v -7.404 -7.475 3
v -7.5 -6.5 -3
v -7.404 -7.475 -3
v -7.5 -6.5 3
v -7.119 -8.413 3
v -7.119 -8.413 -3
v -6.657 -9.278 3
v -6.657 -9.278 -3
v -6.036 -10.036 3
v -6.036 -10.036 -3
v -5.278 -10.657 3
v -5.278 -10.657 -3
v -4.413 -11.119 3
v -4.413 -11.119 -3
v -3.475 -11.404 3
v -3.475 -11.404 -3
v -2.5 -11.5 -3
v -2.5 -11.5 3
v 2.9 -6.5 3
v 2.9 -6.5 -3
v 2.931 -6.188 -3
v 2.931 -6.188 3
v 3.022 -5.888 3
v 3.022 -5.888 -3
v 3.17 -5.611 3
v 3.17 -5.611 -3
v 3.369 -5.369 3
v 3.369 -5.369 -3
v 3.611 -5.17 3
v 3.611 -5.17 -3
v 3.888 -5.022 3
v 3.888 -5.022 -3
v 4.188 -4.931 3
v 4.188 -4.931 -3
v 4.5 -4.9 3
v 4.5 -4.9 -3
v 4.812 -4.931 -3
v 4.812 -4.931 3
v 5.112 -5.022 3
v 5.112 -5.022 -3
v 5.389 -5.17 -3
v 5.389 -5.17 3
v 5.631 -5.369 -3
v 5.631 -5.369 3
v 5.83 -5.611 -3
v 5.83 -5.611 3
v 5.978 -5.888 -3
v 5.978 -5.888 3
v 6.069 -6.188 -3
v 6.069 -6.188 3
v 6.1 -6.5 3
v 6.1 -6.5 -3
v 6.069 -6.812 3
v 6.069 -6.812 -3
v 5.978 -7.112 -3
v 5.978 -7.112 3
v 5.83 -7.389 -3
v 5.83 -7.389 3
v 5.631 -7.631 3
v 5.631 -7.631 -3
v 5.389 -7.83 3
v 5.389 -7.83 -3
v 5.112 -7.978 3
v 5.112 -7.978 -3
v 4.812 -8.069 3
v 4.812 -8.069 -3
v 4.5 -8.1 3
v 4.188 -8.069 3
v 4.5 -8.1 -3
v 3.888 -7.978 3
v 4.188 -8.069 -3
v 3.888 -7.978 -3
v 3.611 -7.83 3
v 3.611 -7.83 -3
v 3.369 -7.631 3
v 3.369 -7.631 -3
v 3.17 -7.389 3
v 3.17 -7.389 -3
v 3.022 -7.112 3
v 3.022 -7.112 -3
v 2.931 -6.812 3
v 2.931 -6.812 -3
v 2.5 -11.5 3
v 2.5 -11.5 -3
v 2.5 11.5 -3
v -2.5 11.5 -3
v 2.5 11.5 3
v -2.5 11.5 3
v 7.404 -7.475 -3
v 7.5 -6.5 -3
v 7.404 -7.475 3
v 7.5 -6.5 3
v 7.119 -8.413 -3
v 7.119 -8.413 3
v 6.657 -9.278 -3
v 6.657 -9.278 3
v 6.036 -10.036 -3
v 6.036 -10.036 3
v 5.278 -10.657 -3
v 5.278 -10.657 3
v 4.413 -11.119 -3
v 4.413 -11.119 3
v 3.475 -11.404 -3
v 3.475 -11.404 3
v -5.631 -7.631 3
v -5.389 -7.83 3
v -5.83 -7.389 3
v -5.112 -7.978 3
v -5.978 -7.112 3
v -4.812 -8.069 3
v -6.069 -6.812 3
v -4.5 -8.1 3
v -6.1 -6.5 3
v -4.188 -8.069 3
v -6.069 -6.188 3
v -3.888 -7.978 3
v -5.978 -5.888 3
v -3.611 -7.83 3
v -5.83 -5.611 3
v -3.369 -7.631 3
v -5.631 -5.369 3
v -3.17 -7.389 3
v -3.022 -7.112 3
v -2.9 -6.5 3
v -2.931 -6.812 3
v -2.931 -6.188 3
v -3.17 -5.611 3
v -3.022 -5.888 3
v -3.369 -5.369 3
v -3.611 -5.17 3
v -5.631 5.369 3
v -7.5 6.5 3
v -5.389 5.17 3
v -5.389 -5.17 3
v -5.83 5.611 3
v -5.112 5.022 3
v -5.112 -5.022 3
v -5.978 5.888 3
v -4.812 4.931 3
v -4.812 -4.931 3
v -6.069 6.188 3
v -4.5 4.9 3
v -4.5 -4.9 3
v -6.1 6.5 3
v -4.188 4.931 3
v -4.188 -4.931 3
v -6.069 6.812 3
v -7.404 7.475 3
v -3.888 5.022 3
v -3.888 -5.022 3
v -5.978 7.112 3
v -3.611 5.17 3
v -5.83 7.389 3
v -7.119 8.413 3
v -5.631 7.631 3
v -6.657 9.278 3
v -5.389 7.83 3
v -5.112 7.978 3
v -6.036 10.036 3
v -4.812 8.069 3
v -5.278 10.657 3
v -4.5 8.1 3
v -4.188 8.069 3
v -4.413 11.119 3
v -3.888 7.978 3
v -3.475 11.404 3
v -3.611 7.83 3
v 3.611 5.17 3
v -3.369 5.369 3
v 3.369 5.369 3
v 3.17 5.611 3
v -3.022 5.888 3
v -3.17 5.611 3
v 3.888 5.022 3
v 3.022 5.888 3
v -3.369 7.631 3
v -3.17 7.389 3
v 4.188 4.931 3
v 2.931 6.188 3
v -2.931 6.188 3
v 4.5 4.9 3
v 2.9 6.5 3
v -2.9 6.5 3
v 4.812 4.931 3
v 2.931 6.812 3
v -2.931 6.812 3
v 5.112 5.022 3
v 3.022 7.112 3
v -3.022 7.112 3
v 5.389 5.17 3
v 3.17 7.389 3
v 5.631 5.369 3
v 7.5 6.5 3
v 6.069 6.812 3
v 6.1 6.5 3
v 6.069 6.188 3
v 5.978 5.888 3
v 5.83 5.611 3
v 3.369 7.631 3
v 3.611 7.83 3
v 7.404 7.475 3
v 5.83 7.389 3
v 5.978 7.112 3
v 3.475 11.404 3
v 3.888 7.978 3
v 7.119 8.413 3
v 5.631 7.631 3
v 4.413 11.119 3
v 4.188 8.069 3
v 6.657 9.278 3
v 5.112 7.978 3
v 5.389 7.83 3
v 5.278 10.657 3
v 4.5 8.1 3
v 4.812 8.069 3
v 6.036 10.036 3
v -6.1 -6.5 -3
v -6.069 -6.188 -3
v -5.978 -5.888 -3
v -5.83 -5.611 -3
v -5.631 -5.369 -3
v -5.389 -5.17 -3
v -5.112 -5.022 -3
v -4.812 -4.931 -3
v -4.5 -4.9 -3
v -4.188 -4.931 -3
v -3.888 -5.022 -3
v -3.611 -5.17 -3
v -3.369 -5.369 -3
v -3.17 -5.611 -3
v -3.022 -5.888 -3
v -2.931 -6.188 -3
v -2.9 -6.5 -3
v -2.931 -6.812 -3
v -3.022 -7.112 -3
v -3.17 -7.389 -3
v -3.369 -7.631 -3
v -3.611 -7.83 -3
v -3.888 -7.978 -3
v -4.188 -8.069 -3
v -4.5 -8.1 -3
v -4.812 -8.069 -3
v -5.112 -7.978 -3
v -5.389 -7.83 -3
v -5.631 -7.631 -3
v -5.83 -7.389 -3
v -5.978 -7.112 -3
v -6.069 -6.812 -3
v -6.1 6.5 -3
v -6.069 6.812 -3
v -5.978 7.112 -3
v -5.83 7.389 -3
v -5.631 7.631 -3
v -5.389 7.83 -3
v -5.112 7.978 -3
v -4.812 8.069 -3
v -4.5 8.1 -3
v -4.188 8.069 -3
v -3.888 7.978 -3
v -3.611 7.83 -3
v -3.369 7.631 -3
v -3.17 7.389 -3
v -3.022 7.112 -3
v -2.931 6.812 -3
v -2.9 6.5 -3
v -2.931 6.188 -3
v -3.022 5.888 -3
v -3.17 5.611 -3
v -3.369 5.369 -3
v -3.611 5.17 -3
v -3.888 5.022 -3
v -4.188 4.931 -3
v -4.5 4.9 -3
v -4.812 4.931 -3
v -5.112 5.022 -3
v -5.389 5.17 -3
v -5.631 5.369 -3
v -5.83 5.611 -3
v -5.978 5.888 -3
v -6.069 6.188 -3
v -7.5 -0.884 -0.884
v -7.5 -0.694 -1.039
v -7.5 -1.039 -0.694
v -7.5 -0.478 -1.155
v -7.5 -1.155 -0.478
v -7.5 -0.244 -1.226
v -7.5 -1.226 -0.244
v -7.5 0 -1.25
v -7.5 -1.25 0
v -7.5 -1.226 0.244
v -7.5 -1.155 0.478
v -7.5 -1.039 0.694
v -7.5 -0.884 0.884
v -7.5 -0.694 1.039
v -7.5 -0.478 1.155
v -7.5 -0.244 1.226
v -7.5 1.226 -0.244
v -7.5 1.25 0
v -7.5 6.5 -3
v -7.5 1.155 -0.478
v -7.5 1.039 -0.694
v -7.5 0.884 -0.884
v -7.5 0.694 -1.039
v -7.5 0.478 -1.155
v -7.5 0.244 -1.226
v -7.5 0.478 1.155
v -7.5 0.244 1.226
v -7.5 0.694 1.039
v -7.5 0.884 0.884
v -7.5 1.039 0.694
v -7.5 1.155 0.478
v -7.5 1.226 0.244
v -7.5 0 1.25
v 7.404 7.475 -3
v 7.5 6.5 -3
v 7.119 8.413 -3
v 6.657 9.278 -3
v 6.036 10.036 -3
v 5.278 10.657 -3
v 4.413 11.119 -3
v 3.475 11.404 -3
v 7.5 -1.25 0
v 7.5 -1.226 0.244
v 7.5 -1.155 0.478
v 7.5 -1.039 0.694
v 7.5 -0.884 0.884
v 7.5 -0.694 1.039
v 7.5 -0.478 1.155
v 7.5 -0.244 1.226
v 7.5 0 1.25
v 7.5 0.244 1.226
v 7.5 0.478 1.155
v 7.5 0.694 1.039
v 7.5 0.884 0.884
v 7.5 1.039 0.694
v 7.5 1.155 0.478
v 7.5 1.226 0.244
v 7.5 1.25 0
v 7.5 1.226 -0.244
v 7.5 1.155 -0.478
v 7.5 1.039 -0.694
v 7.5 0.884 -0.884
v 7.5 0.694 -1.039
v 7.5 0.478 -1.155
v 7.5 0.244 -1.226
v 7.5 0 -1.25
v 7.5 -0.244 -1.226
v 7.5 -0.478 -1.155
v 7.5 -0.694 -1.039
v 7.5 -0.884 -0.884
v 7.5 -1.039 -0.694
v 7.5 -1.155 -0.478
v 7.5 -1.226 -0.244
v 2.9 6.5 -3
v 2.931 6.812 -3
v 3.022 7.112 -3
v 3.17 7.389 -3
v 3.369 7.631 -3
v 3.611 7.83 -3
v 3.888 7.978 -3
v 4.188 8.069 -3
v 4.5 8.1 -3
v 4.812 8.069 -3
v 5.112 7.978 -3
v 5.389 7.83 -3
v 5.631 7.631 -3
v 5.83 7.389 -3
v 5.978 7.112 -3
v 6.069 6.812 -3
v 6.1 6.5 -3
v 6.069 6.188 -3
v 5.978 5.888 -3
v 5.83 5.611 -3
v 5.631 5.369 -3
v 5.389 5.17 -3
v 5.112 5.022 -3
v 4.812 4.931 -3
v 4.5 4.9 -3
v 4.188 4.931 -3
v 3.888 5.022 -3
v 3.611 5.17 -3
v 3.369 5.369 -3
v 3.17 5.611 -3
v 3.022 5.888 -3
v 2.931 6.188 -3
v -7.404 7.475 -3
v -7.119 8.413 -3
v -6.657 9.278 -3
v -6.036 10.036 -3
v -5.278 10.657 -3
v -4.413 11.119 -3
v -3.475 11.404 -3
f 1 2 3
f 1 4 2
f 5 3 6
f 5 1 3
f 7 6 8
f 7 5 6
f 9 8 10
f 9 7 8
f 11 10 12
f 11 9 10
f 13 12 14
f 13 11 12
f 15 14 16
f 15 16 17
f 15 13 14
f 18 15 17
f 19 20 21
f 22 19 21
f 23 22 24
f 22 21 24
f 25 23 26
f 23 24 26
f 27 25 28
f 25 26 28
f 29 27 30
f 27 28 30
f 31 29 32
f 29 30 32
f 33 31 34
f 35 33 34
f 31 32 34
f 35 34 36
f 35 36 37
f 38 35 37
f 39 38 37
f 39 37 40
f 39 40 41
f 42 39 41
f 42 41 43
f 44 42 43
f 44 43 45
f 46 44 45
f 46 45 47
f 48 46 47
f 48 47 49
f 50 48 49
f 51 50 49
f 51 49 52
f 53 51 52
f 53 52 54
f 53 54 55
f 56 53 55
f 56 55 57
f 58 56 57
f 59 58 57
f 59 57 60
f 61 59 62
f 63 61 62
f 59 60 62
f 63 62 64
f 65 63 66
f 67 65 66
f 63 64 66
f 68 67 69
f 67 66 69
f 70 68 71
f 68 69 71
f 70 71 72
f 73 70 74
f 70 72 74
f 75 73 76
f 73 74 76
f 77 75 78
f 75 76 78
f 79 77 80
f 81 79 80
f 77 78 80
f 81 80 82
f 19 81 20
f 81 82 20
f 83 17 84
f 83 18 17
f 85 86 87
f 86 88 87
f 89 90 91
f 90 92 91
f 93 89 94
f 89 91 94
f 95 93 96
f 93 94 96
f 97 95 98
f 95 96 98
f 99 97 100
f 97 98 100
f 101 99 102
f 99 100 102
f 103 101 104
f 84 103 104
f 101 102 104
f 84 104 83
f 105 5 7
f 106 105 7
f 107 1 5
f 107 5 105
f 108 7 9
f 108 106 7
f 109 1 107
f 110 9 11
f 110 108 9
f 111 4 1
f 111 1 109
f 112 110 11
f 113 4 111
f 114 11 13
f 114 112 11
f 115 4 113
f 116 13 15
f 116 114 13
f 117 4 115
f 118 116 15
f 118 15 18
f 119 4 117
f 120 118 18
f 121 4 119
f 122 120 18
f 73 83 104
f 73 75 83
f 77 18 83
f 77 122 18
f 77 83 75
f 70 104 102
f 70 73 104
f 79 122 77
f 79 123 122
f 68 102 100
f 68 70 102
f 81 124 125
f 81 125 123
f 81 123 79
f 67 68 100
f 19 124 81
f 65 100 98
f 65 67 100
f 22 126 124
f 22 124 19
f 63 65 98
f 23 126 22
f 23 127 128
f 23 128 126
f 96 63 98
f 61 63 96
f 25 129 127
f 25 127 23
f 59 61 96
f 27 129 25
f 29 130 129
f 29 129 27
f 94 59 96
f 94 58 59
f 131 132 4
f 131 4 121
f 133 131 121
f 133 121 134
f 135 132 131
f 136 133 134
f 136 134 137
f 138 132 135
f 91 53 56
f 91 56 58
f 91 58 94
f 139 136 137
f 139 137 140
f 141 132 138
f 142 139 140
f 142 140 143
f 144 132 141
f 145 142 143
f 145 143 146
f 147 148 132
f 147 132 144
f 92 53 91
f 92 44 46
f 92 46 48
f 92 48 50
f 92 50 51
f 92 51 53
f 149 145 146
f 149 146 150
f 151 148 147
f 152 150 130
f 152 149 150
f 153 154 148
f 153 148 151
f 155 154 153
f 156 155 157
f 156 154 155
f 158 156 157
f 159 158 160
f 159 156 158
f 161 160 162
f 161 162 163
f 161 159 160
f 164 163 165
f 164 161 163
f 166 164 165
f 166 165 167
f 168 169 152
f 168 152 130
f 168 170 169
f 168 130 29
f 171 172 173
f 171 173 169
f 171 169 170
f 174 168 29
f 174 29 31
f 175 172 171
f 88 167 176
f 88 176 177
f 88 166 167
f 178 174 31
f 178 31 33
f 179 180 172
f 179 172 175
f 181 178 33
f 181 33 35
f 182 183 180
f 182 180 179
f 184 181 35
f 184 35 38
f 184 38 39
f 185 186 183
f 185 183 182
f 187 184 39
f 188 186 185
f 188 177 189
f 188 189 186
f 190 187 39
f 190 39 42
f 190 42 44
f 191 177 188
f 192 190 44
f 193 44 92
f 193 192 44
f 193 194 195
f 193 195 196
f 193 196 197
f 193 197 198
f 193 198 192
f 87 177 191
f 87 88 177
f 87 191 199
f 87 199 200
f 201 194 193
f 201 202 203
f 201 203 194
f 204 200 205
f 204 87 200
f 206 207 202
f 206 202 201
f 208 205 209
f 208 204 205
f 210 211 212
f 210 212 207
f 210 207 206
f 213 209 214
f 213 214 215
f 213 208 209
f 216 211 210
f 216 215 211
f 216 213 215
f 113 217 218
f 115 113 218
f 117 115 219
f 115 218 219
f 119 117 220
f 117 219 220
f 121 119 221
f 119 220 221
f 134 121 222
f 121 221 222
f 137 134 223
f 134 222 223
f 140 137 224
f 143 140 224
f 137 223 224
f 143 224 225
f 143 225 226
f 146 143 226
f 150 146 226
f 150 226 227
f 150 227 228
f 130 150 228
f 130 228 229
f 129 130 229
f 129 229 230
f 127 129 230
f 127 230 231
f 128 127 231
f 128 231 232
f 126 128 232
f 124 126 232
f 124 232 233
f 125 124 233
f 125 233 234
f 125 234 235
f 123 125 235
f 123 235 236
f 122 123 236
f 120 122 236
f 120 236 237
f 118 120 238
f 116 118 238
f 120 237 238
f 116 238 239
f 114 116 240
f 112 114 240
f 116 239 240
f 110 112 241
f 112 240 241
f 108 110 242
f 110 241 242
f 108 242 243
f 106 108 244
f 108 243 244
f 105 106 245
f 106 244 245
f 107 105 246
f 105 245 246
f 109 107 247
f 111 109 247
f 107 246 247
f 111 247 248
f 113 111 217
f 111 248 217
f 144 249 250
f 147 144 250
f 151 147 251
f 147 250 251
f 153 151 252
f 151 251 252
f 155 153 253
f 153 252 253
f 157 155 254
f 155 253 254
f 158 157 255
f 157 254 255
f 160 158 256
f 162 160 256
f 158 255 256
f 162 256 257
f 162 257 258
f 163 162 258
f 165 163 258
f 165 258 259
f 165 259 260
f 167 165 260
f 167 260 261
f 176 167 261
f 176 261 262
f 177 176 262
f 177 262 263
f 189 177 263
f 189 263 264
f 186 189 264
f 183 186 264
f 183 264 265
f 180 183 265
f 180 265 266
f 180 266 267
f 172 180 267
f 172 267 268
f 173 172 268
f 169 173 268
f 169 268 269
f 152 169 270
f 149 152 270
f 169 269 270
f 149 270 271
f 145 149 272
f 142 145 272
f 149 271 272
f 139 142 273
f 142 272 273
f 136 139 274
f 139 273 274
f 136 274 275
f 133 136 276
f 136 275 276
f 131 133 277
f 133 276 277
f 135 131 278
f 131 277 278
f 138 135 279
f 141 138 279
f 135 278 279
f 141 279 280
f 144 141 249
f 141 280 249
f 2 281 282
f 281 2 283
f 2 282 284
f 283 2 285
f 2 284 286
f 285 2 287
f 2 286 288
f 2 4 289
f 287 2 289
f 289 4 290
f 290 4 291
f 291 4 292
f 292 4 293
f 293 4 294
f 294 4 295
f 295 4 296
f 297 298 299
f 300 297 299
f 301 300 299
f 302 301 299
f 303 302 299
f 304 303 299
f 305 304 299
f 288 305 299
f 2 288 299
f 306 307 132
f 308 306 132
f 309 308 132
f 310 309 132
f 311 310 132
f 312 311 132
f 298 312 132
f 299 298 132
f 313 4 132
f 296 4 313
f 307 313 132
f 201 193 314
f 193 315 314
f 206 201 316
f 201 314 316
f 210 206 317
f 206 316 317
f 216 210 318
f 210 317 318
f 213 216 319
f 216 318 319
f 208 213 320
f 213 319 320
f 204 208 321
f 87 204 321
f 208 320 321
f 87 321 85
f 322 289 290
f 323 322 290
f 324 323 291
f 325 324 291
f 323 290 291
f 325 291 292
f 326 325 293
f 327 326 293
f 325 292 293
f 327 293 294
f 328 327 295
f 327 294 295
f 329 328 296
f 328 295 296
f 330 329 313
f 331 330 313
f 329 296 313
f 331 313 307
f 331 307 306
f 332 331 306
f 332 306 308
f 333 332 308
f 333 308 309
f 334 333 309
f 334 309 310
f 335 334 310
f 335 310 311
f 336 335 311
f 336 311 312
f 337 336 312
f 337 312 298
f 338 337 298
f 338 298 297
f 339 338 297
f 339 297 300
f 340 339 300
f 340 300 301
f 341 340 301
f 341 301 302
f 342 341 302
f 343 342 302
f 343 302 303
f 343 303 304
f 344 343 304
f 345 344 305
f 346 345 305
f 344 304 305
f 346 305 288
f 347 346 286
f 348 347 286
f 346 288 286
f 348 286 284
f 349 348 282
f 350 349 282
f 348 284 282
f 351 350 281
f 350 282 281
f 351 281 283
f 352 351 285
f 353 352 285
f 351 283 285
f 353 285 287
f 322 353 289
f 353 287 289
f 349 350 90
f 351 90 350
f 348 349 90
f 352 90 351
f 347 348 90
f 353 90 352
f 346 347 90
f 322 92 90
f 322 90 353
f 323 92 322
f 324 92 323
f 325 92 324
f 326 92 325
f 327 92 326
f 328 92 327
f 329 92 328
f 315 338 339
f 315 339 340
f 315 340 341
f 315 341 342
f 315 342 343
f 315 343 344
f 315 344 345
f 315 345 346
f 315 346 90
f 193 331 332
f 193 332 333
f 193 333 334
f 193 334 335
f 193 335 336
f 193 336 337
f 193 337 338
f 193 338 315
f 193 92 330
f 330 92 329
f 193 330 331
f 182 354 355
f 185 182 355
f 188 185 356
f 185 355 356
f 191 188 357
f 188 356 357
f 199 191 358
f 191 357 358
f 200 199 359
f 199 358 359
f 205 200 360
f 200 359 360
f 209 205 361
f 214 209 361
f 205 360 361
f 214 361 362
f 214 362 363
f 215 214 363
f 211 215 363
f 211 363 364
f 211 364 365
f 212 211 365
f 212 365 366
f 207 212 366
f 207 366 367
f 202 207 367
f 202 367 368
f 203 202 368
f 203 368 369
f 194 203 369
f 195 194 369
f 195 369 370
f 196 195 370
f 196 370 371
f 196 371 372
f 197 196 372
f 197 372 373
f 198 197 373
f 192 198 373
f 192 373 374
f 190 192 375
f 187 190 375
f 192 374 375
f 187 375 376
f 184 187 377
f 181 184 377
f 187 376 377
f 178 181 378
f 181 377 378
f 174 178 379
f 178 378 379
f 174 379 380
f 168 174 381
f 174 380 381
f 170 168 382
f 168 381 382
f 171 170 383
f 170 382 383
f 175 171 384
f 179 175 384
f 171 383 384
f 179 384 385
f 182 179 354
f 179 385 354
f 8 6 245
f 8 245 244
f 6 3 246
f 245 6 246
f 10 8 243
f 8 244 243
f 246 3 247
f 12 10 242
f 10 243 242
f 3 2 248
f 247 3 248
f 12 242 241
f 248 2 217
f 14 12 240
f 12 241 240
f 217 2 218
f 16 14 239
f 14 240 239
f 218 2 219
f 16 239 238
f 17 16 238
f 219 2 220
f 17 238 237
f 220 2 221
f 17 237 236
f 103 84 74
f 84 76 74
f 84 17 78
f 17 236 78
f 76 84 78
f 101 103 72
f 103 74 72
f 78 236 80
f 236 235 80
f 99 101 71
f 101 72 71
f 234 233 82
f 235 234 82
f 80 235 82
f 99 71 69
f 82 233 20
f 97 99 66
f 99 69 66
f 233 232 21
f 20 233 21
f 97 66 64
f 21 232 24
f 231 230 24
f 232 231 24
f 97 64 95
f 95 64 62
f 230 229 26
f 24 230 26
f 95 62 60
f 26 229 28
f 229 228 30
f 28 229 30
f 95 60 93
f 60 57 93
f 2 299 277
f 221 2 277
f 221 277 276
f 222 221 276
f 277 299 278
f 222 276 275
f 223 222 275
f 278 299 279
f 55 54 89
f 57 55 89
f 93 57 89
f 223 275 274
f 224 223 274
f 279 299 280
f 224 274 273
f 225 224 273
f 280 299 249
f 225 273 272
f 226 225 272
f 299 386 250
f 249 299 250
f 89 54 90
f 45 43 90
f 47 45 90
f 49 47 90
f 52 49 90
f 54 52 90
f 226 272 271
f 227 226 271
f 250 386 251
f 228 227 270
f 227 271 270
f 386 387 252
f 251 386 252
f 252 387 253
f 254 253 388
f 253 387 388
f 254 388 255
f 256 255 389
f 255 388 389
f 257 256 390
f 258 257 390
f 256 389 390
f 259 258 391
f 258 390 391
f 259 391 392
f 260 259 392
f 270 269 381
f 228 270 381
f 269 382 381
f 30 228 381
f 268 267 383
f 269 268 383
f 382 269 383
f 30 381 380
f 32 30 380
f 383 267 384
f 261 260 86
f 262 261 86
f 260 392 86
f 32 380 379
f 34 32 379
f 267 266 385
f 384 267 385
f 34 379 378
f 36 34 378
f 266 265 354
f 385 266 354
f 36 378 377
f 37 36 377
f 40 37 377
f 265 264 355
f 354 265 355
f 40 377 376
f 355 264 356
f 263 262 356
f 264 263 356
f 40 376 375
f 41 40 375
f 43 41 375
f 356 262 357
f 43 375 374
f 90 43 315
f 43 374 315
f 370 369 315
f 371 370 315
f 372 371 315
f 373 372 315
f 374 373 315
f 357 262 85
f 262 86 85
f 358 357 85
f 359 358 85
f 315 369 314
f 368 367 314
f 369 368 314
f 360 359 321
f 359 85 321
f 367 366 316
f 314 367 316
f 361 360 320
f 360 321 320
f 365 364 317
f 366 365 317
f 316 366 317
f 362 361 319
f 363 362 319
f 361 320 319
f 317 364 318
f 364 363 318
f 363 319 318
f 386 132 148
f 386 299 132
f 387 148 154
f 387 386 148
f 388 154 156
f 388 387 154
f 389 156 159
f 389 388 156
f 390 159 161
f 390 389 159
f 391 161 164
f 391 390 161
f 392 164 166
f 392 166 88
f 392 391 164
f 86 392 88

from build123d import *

# Parameters (mm, degrees)
SKETCH_1_W         = 15
SKETCH_1_H         = 23
EXTRUDE_1_DEPTH    = 3
FILLET_1_R         = 5
HOLE_WIZARD_M3_1_D = 3.2
M3X0_5_1_D         = 2.5


with BuildPart() as part:
    # ｽｹｯﾁ1 → ﾎﾞｽ - 押し出し1 (new, symmetric)
    with BuildSketch(Plane.XY):
        Rectangle(SKETCH_1_W, SKETCH_1_H)
    extrude(amount=EXTRUDE_1_DEPTH, both=True)

    # ﾌｨﾚｯﾄ1
    fillet_1_edges = [part.edges().sort_by_distance(p)[0] for p in [
        (7.5, -11.5, 0),
        (-7.5, -11.5, 0),
        (-7.5, 11.5, 0),
        (7.5, 11.5, 0),
    ]]
    fillet(fillet_1_edges, radius=FILLET_1_R)

    # M3 すきま穴1 (through all)
    with Locations(Plane(origin=(-4.5, 6.5, 3), x_dir=(1, 0, 0), z_dir=(0, 0, 1))):
        with Locations((0, 0), (9, 0), (9, -13), (0, -13)):
            Hole(HOLE_WIZARD_M3_1_D / 2)

    # M3x0.5 ねじ穴1 (through all)
    with Locations(Plane.YZ.offset(7.5)):
        with Locations((0, 0)):
            Hole(M3X0_5_1_D / 2)


solid = part.part
